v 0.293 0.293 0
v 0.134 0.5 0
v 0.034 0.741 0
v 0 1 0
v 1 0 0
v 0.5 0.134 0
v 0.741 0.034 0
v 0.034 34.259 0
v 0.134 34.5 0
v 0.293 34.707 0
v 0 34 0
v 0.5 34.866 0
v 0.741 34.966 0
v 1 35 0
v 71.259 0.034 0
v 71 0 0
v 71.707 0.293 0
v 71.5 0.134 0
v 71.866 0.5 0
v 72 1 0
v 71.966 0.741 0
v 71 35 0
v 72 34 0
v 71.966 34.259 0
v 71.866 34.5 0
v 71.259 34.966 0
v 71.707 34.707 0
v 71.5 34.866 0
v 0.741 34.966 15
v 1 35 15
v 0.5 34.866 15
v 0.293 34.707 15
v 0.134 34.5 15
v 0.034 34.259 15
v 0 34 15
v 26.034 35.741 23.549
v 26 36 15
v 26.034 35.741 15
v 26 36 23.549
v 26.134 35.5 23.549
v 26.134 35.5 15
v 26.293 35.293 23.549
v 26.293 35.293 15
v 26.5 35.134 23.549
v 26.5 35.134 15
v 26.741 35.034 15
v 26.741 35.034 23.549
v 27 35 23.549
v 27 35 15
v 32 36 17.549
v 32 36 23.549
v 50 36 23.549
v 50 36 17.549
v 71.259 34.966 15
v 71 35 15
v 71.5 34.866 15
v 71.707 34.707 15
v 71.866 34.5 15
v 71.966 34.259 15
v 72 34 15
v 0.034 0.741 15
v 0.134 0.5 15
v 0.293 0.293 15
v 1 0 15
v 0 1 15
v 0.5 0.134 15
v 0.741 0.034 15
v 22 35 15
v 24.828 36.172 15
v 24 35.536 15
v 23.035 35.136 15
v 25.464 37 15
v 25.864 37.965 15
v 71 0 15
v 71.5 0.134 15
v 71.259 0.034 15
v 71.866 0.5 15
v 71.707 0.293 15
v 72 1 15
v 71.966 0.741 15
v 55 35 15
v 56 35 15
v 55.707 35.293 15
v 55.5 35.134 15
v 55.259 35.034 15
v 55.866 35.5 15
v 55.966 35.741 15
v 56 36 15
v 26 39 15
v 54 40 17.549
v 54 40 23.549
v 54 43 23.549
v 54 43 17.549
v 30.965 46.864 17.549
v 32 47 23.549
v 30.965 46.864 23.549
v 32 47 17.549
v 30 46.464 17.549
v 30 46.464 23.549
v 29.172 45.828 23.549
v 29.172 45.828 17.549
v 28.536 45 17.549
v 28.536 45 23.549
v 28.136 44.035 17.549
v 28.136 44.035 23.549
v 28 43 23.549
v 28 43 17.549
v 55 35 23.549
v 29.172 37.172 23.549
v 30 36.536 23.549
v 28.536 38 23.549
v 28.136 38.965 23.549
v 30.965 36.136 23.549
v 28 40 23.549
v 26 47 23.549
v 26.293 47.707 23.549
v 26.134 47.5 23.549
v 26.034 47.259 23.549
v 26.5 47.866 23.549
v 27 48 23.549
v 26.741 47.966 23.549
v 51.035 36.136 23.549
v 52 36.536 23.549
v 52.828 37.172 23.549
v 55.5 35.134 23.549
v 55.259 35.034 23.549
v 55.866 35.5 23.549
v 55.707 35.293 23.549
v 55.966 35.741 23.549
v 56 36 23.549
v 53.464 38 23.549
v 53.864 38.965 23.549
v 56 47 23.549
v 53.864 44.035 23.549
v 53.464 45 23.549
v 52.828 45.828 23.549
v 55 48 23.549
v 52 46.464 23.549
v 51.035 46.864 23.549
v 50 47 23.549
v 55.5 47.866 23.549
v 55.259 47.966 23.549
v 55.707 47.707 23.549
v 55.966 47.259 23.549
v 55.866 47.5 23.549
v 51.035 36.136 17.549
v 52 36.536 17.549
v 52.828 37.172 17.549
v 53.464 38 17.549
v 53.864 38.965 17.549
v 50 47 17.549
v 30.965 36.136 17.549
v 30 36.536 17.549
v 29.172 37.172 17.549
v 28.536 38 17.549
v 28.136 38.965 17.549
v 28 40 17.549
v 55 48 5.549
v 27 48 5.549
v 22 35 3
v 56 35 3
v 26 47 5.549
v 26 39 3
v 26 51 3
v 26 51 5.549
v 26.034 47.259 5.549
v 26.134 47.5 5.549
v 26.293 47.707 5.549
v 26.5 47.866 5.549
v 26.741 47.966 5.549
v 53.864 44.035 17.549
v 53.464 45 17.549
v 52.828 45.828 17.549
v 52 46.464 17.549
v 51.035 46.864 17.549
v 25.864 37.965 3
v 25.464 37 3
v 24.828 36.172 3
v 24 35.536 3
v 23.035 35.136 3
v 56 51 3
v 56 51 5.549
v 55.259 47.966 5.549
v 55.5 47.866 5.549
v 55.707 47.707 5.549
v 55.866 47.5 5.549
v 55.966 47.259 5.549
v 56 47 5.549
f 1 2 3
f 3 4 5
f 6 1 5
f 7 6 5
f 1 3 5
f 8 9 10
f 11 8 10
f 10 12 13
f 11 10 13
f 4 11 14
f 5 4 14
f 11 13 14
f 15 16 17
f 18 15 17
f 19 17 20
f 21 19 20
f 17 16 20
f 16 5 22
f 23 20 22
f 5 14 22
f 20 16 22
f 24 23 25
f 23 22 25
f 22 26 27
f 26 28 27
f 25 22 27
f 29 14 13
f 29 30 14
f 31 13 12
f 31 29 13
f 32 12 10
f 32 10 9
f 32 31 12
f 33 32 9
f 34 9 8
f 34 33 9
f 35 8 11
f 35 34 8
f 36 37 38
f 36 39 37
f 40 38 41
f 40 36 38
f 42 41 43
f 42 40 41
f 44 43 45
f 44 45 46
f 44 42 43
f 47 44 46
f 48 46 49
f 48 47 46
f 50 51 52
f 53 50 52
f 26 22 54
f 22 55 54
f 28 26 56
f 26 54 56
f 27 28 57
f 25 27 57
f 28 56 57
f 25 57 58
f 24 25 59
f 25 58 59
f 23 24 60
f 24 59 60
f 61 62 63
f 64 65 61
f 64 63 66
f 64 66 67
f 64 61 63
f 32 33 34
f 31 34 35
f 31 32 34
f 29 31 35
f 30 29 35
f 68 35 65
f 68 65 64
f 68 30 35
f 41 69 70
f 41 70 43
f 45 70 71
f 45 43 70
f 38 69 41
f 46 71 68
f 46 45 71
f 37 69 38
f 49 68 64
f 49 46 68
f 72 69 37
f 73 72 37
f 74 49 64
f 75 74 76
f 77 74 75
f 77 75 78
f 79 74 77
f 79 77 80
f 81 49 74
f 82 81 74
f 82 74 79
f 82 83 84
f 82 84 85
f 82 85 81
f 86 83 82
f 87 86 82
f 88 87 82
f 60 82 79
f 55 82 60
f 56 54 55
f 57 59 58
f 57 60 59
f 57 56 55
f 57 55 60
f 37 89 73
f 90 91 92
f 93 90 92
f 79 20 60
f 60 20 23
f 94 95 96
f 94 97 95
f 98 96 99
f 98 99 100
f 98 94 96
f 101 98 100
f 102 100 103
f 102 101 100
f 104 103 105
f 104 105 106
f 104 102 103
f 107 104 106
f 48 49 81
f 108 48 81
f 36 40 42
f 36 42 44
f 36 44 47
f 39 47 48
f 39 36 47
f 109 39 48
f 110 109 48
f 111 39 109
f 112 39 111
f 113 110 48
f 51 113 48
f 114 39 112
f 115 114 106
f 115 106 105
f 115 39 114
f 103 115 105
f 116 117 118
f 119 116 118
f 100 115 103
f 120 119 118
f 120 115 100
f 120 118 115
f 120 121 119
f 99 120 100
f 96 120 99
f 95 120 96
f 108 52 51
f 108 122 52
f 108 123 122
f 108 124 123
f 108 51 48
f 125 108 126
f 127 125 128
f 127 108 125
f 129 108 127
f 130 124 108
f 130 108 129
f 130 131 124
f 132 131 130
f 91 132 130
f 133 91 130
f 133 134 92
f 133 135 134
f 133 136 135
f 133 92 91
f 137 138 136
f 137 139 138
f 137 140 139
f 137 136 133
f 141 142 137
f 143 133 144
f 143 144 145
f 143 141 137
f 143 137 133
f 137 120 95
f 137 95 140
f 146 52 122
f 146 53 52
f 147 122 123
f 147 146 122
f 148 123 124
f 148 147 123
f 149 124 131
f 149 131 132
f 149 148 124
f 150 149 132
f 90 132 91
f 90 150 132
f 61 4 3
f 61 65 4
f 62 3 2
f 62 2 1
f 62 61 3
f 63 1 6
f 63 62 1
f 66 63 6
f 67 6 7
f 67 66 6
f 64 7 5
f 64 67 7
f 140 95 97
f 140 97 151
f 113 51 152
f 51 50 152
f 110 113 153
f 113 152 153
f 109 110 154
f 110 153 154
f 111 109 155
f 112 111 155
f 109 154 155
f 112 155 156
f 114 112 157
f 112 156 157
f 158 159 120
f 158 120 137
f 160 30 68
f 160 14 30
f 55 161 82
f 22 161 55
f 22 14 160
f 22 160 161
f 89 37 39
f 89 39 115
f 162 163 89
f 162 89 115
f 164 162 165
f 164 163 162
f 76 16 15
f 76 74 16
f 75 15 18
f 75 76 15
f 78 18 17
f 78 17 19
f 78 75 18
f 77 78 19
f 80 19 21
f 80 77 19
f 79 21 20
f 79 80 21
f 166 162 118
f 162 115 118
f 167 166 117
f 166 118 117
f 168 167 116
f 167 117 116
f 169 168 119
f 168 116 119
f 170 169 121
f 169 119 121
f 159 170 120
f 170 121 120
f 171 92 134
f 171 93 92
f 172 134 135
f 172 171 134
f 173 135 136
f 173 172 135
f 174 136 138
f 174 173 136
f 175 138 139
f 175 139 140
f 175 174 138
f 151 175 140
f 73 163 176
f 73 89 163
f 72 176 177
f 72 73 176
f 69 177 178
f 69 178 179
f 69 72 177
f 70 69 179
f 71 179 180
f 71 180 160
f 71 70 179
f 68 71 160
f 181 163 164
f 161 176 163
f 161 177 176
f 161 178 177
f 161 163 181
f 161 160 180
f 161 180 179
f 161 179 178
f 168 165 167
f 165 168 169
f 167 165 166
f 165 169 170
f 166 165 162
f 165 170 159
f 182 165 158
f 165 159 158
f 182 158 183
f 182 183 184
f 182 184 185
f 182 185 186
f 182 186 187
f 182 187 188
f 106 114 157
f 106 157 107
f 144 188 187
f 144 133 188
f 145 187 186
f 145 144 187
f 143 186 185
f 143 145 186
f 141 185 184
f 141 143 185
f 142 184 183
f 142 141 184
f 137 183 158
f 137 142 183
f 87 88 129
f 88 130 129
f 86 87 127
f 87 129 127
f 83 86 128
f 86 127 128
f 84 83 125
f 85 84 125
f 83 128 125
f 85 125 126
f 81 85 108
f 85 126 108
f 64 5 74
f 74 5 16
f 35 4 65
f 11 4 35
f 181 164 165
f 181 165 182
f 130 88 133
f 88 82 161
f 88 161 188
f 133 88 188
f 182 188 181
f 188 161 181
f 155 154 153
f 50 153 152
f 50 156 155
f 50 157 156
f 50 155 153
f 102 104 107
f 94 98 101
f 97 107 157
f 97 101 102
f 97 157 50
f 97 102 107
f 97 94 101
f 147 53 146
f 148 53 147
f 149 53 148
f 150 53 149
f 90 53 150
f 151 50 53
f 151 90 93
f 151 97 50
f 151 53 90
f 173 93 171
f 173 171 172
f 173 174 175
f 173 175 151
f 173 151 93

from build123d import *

# Parameters (mm, degrees)
SKETCH_1_W          = 72
SKETCH_1_H          = 35
EXTRUDE_1_DEPTH     = 15
SKETCH_2_W          = 30
SKETCH_2_H          = 2.549015657
EXTRUDE_2_DEPTH     = 16
SKETCH_3_W          = 30
SKETCH_3_H          = 13
EXTRUDE_3_DEPTH     = 18
SKETCH_4_W          = 26
SKETCH_4_H          = 11
CUT_EXTRUDE_1_DEPTH = 6
FILLET_1_R          = 4
FILLET_3_R          = 4
FILLET_2_R          = 1


with BuildPart() as part:
    # ｽｹｯﾁ1 → ﾎﾞｽ - 押し出し1 (new body)
    with BuildSketch(Plane.XY):
        with Locations((36, 17.5)):
            Rectangle(SKETCH_1_W, SKETCH_1_H)
    extrude(amount=EXTRUDE_1_DEPTH)

    # ｽｹｯﾁ2 → ﾎﾞｽ - 押し出し2 (add)
    with BuildSketch(Plane(origin=(0, 35, 0), x_dir=(1, 0, 0), z_dir=(0, 1, 0))):
        with Locations((41, -4.274507828)):
            Rectangle(SKETCH_2_W, SKETCH_2_H)
    extrude(amount=EXTRUDE_2_DEPTH)

    # ｽｹｯﾁ3 → ﾎﾞｽ - 押し出し3 (add)
    with BuildSketch(Plane.XY.offset(5.549015657)):
        with Locations((41, 41.5)):
            Rectangle(SKETCH_3_W, SKETCH_3_H)
    extrude(amount=EXTRUDE_3_DEPTH)

    # ｽｹｯﾁ4 → ｶｯﾄ - 押し出し1 (cut)
    with BuildSketch(Plane.XY.offset(23.549015657)):
        with Locations((41, 41.5)):
            Rectangle(SKETCH_4_W, SKETCH_4_H)
    extrude(amount=-CUT_EXTRUDE_1_DEPTH, mode=Mode.SUBTRACT)

    # ﾌｨﾚｯﾄ1
    fillet_1_edges = [part.edges().sort_by_distance(p)[0] for p in [
        (28, 36, 20.549015657),
        (28, 47, 20.549015657),
        (54, 47, 20.549015657),
        (54, 36, 20.549015657),
    ]]
    fillet(fillet_1_edges, radius=FILLET_1_R)

    # ﾌｨﾚｯﾄ3
    fillet_3_edges = [part.edges().sort_by_distance(p)[0] for p in [
        (26, 35, 9),
    ]]
    fillet(fillet_3_edges, radius=FILLET_3_R)

    # ﾌｨﾚｯﾄ2
    fillet_2_edges = [part.edges().sort_by_distance(p)[0] for p in [
        (26, 35, 19.274507829),
        (26, 48, 14.549015657),
        (56, 35, 19.274507829),
        (56, 48, 14.549015657),
        (0, 35, 7.5),
        (72, 35, 7.5),
        (72, 0, 7.5),
        (0, 0, 7.5),
    ]]
    fillet(fillet_2_edges, radius=FILLET_2_R)


solid = part.part
